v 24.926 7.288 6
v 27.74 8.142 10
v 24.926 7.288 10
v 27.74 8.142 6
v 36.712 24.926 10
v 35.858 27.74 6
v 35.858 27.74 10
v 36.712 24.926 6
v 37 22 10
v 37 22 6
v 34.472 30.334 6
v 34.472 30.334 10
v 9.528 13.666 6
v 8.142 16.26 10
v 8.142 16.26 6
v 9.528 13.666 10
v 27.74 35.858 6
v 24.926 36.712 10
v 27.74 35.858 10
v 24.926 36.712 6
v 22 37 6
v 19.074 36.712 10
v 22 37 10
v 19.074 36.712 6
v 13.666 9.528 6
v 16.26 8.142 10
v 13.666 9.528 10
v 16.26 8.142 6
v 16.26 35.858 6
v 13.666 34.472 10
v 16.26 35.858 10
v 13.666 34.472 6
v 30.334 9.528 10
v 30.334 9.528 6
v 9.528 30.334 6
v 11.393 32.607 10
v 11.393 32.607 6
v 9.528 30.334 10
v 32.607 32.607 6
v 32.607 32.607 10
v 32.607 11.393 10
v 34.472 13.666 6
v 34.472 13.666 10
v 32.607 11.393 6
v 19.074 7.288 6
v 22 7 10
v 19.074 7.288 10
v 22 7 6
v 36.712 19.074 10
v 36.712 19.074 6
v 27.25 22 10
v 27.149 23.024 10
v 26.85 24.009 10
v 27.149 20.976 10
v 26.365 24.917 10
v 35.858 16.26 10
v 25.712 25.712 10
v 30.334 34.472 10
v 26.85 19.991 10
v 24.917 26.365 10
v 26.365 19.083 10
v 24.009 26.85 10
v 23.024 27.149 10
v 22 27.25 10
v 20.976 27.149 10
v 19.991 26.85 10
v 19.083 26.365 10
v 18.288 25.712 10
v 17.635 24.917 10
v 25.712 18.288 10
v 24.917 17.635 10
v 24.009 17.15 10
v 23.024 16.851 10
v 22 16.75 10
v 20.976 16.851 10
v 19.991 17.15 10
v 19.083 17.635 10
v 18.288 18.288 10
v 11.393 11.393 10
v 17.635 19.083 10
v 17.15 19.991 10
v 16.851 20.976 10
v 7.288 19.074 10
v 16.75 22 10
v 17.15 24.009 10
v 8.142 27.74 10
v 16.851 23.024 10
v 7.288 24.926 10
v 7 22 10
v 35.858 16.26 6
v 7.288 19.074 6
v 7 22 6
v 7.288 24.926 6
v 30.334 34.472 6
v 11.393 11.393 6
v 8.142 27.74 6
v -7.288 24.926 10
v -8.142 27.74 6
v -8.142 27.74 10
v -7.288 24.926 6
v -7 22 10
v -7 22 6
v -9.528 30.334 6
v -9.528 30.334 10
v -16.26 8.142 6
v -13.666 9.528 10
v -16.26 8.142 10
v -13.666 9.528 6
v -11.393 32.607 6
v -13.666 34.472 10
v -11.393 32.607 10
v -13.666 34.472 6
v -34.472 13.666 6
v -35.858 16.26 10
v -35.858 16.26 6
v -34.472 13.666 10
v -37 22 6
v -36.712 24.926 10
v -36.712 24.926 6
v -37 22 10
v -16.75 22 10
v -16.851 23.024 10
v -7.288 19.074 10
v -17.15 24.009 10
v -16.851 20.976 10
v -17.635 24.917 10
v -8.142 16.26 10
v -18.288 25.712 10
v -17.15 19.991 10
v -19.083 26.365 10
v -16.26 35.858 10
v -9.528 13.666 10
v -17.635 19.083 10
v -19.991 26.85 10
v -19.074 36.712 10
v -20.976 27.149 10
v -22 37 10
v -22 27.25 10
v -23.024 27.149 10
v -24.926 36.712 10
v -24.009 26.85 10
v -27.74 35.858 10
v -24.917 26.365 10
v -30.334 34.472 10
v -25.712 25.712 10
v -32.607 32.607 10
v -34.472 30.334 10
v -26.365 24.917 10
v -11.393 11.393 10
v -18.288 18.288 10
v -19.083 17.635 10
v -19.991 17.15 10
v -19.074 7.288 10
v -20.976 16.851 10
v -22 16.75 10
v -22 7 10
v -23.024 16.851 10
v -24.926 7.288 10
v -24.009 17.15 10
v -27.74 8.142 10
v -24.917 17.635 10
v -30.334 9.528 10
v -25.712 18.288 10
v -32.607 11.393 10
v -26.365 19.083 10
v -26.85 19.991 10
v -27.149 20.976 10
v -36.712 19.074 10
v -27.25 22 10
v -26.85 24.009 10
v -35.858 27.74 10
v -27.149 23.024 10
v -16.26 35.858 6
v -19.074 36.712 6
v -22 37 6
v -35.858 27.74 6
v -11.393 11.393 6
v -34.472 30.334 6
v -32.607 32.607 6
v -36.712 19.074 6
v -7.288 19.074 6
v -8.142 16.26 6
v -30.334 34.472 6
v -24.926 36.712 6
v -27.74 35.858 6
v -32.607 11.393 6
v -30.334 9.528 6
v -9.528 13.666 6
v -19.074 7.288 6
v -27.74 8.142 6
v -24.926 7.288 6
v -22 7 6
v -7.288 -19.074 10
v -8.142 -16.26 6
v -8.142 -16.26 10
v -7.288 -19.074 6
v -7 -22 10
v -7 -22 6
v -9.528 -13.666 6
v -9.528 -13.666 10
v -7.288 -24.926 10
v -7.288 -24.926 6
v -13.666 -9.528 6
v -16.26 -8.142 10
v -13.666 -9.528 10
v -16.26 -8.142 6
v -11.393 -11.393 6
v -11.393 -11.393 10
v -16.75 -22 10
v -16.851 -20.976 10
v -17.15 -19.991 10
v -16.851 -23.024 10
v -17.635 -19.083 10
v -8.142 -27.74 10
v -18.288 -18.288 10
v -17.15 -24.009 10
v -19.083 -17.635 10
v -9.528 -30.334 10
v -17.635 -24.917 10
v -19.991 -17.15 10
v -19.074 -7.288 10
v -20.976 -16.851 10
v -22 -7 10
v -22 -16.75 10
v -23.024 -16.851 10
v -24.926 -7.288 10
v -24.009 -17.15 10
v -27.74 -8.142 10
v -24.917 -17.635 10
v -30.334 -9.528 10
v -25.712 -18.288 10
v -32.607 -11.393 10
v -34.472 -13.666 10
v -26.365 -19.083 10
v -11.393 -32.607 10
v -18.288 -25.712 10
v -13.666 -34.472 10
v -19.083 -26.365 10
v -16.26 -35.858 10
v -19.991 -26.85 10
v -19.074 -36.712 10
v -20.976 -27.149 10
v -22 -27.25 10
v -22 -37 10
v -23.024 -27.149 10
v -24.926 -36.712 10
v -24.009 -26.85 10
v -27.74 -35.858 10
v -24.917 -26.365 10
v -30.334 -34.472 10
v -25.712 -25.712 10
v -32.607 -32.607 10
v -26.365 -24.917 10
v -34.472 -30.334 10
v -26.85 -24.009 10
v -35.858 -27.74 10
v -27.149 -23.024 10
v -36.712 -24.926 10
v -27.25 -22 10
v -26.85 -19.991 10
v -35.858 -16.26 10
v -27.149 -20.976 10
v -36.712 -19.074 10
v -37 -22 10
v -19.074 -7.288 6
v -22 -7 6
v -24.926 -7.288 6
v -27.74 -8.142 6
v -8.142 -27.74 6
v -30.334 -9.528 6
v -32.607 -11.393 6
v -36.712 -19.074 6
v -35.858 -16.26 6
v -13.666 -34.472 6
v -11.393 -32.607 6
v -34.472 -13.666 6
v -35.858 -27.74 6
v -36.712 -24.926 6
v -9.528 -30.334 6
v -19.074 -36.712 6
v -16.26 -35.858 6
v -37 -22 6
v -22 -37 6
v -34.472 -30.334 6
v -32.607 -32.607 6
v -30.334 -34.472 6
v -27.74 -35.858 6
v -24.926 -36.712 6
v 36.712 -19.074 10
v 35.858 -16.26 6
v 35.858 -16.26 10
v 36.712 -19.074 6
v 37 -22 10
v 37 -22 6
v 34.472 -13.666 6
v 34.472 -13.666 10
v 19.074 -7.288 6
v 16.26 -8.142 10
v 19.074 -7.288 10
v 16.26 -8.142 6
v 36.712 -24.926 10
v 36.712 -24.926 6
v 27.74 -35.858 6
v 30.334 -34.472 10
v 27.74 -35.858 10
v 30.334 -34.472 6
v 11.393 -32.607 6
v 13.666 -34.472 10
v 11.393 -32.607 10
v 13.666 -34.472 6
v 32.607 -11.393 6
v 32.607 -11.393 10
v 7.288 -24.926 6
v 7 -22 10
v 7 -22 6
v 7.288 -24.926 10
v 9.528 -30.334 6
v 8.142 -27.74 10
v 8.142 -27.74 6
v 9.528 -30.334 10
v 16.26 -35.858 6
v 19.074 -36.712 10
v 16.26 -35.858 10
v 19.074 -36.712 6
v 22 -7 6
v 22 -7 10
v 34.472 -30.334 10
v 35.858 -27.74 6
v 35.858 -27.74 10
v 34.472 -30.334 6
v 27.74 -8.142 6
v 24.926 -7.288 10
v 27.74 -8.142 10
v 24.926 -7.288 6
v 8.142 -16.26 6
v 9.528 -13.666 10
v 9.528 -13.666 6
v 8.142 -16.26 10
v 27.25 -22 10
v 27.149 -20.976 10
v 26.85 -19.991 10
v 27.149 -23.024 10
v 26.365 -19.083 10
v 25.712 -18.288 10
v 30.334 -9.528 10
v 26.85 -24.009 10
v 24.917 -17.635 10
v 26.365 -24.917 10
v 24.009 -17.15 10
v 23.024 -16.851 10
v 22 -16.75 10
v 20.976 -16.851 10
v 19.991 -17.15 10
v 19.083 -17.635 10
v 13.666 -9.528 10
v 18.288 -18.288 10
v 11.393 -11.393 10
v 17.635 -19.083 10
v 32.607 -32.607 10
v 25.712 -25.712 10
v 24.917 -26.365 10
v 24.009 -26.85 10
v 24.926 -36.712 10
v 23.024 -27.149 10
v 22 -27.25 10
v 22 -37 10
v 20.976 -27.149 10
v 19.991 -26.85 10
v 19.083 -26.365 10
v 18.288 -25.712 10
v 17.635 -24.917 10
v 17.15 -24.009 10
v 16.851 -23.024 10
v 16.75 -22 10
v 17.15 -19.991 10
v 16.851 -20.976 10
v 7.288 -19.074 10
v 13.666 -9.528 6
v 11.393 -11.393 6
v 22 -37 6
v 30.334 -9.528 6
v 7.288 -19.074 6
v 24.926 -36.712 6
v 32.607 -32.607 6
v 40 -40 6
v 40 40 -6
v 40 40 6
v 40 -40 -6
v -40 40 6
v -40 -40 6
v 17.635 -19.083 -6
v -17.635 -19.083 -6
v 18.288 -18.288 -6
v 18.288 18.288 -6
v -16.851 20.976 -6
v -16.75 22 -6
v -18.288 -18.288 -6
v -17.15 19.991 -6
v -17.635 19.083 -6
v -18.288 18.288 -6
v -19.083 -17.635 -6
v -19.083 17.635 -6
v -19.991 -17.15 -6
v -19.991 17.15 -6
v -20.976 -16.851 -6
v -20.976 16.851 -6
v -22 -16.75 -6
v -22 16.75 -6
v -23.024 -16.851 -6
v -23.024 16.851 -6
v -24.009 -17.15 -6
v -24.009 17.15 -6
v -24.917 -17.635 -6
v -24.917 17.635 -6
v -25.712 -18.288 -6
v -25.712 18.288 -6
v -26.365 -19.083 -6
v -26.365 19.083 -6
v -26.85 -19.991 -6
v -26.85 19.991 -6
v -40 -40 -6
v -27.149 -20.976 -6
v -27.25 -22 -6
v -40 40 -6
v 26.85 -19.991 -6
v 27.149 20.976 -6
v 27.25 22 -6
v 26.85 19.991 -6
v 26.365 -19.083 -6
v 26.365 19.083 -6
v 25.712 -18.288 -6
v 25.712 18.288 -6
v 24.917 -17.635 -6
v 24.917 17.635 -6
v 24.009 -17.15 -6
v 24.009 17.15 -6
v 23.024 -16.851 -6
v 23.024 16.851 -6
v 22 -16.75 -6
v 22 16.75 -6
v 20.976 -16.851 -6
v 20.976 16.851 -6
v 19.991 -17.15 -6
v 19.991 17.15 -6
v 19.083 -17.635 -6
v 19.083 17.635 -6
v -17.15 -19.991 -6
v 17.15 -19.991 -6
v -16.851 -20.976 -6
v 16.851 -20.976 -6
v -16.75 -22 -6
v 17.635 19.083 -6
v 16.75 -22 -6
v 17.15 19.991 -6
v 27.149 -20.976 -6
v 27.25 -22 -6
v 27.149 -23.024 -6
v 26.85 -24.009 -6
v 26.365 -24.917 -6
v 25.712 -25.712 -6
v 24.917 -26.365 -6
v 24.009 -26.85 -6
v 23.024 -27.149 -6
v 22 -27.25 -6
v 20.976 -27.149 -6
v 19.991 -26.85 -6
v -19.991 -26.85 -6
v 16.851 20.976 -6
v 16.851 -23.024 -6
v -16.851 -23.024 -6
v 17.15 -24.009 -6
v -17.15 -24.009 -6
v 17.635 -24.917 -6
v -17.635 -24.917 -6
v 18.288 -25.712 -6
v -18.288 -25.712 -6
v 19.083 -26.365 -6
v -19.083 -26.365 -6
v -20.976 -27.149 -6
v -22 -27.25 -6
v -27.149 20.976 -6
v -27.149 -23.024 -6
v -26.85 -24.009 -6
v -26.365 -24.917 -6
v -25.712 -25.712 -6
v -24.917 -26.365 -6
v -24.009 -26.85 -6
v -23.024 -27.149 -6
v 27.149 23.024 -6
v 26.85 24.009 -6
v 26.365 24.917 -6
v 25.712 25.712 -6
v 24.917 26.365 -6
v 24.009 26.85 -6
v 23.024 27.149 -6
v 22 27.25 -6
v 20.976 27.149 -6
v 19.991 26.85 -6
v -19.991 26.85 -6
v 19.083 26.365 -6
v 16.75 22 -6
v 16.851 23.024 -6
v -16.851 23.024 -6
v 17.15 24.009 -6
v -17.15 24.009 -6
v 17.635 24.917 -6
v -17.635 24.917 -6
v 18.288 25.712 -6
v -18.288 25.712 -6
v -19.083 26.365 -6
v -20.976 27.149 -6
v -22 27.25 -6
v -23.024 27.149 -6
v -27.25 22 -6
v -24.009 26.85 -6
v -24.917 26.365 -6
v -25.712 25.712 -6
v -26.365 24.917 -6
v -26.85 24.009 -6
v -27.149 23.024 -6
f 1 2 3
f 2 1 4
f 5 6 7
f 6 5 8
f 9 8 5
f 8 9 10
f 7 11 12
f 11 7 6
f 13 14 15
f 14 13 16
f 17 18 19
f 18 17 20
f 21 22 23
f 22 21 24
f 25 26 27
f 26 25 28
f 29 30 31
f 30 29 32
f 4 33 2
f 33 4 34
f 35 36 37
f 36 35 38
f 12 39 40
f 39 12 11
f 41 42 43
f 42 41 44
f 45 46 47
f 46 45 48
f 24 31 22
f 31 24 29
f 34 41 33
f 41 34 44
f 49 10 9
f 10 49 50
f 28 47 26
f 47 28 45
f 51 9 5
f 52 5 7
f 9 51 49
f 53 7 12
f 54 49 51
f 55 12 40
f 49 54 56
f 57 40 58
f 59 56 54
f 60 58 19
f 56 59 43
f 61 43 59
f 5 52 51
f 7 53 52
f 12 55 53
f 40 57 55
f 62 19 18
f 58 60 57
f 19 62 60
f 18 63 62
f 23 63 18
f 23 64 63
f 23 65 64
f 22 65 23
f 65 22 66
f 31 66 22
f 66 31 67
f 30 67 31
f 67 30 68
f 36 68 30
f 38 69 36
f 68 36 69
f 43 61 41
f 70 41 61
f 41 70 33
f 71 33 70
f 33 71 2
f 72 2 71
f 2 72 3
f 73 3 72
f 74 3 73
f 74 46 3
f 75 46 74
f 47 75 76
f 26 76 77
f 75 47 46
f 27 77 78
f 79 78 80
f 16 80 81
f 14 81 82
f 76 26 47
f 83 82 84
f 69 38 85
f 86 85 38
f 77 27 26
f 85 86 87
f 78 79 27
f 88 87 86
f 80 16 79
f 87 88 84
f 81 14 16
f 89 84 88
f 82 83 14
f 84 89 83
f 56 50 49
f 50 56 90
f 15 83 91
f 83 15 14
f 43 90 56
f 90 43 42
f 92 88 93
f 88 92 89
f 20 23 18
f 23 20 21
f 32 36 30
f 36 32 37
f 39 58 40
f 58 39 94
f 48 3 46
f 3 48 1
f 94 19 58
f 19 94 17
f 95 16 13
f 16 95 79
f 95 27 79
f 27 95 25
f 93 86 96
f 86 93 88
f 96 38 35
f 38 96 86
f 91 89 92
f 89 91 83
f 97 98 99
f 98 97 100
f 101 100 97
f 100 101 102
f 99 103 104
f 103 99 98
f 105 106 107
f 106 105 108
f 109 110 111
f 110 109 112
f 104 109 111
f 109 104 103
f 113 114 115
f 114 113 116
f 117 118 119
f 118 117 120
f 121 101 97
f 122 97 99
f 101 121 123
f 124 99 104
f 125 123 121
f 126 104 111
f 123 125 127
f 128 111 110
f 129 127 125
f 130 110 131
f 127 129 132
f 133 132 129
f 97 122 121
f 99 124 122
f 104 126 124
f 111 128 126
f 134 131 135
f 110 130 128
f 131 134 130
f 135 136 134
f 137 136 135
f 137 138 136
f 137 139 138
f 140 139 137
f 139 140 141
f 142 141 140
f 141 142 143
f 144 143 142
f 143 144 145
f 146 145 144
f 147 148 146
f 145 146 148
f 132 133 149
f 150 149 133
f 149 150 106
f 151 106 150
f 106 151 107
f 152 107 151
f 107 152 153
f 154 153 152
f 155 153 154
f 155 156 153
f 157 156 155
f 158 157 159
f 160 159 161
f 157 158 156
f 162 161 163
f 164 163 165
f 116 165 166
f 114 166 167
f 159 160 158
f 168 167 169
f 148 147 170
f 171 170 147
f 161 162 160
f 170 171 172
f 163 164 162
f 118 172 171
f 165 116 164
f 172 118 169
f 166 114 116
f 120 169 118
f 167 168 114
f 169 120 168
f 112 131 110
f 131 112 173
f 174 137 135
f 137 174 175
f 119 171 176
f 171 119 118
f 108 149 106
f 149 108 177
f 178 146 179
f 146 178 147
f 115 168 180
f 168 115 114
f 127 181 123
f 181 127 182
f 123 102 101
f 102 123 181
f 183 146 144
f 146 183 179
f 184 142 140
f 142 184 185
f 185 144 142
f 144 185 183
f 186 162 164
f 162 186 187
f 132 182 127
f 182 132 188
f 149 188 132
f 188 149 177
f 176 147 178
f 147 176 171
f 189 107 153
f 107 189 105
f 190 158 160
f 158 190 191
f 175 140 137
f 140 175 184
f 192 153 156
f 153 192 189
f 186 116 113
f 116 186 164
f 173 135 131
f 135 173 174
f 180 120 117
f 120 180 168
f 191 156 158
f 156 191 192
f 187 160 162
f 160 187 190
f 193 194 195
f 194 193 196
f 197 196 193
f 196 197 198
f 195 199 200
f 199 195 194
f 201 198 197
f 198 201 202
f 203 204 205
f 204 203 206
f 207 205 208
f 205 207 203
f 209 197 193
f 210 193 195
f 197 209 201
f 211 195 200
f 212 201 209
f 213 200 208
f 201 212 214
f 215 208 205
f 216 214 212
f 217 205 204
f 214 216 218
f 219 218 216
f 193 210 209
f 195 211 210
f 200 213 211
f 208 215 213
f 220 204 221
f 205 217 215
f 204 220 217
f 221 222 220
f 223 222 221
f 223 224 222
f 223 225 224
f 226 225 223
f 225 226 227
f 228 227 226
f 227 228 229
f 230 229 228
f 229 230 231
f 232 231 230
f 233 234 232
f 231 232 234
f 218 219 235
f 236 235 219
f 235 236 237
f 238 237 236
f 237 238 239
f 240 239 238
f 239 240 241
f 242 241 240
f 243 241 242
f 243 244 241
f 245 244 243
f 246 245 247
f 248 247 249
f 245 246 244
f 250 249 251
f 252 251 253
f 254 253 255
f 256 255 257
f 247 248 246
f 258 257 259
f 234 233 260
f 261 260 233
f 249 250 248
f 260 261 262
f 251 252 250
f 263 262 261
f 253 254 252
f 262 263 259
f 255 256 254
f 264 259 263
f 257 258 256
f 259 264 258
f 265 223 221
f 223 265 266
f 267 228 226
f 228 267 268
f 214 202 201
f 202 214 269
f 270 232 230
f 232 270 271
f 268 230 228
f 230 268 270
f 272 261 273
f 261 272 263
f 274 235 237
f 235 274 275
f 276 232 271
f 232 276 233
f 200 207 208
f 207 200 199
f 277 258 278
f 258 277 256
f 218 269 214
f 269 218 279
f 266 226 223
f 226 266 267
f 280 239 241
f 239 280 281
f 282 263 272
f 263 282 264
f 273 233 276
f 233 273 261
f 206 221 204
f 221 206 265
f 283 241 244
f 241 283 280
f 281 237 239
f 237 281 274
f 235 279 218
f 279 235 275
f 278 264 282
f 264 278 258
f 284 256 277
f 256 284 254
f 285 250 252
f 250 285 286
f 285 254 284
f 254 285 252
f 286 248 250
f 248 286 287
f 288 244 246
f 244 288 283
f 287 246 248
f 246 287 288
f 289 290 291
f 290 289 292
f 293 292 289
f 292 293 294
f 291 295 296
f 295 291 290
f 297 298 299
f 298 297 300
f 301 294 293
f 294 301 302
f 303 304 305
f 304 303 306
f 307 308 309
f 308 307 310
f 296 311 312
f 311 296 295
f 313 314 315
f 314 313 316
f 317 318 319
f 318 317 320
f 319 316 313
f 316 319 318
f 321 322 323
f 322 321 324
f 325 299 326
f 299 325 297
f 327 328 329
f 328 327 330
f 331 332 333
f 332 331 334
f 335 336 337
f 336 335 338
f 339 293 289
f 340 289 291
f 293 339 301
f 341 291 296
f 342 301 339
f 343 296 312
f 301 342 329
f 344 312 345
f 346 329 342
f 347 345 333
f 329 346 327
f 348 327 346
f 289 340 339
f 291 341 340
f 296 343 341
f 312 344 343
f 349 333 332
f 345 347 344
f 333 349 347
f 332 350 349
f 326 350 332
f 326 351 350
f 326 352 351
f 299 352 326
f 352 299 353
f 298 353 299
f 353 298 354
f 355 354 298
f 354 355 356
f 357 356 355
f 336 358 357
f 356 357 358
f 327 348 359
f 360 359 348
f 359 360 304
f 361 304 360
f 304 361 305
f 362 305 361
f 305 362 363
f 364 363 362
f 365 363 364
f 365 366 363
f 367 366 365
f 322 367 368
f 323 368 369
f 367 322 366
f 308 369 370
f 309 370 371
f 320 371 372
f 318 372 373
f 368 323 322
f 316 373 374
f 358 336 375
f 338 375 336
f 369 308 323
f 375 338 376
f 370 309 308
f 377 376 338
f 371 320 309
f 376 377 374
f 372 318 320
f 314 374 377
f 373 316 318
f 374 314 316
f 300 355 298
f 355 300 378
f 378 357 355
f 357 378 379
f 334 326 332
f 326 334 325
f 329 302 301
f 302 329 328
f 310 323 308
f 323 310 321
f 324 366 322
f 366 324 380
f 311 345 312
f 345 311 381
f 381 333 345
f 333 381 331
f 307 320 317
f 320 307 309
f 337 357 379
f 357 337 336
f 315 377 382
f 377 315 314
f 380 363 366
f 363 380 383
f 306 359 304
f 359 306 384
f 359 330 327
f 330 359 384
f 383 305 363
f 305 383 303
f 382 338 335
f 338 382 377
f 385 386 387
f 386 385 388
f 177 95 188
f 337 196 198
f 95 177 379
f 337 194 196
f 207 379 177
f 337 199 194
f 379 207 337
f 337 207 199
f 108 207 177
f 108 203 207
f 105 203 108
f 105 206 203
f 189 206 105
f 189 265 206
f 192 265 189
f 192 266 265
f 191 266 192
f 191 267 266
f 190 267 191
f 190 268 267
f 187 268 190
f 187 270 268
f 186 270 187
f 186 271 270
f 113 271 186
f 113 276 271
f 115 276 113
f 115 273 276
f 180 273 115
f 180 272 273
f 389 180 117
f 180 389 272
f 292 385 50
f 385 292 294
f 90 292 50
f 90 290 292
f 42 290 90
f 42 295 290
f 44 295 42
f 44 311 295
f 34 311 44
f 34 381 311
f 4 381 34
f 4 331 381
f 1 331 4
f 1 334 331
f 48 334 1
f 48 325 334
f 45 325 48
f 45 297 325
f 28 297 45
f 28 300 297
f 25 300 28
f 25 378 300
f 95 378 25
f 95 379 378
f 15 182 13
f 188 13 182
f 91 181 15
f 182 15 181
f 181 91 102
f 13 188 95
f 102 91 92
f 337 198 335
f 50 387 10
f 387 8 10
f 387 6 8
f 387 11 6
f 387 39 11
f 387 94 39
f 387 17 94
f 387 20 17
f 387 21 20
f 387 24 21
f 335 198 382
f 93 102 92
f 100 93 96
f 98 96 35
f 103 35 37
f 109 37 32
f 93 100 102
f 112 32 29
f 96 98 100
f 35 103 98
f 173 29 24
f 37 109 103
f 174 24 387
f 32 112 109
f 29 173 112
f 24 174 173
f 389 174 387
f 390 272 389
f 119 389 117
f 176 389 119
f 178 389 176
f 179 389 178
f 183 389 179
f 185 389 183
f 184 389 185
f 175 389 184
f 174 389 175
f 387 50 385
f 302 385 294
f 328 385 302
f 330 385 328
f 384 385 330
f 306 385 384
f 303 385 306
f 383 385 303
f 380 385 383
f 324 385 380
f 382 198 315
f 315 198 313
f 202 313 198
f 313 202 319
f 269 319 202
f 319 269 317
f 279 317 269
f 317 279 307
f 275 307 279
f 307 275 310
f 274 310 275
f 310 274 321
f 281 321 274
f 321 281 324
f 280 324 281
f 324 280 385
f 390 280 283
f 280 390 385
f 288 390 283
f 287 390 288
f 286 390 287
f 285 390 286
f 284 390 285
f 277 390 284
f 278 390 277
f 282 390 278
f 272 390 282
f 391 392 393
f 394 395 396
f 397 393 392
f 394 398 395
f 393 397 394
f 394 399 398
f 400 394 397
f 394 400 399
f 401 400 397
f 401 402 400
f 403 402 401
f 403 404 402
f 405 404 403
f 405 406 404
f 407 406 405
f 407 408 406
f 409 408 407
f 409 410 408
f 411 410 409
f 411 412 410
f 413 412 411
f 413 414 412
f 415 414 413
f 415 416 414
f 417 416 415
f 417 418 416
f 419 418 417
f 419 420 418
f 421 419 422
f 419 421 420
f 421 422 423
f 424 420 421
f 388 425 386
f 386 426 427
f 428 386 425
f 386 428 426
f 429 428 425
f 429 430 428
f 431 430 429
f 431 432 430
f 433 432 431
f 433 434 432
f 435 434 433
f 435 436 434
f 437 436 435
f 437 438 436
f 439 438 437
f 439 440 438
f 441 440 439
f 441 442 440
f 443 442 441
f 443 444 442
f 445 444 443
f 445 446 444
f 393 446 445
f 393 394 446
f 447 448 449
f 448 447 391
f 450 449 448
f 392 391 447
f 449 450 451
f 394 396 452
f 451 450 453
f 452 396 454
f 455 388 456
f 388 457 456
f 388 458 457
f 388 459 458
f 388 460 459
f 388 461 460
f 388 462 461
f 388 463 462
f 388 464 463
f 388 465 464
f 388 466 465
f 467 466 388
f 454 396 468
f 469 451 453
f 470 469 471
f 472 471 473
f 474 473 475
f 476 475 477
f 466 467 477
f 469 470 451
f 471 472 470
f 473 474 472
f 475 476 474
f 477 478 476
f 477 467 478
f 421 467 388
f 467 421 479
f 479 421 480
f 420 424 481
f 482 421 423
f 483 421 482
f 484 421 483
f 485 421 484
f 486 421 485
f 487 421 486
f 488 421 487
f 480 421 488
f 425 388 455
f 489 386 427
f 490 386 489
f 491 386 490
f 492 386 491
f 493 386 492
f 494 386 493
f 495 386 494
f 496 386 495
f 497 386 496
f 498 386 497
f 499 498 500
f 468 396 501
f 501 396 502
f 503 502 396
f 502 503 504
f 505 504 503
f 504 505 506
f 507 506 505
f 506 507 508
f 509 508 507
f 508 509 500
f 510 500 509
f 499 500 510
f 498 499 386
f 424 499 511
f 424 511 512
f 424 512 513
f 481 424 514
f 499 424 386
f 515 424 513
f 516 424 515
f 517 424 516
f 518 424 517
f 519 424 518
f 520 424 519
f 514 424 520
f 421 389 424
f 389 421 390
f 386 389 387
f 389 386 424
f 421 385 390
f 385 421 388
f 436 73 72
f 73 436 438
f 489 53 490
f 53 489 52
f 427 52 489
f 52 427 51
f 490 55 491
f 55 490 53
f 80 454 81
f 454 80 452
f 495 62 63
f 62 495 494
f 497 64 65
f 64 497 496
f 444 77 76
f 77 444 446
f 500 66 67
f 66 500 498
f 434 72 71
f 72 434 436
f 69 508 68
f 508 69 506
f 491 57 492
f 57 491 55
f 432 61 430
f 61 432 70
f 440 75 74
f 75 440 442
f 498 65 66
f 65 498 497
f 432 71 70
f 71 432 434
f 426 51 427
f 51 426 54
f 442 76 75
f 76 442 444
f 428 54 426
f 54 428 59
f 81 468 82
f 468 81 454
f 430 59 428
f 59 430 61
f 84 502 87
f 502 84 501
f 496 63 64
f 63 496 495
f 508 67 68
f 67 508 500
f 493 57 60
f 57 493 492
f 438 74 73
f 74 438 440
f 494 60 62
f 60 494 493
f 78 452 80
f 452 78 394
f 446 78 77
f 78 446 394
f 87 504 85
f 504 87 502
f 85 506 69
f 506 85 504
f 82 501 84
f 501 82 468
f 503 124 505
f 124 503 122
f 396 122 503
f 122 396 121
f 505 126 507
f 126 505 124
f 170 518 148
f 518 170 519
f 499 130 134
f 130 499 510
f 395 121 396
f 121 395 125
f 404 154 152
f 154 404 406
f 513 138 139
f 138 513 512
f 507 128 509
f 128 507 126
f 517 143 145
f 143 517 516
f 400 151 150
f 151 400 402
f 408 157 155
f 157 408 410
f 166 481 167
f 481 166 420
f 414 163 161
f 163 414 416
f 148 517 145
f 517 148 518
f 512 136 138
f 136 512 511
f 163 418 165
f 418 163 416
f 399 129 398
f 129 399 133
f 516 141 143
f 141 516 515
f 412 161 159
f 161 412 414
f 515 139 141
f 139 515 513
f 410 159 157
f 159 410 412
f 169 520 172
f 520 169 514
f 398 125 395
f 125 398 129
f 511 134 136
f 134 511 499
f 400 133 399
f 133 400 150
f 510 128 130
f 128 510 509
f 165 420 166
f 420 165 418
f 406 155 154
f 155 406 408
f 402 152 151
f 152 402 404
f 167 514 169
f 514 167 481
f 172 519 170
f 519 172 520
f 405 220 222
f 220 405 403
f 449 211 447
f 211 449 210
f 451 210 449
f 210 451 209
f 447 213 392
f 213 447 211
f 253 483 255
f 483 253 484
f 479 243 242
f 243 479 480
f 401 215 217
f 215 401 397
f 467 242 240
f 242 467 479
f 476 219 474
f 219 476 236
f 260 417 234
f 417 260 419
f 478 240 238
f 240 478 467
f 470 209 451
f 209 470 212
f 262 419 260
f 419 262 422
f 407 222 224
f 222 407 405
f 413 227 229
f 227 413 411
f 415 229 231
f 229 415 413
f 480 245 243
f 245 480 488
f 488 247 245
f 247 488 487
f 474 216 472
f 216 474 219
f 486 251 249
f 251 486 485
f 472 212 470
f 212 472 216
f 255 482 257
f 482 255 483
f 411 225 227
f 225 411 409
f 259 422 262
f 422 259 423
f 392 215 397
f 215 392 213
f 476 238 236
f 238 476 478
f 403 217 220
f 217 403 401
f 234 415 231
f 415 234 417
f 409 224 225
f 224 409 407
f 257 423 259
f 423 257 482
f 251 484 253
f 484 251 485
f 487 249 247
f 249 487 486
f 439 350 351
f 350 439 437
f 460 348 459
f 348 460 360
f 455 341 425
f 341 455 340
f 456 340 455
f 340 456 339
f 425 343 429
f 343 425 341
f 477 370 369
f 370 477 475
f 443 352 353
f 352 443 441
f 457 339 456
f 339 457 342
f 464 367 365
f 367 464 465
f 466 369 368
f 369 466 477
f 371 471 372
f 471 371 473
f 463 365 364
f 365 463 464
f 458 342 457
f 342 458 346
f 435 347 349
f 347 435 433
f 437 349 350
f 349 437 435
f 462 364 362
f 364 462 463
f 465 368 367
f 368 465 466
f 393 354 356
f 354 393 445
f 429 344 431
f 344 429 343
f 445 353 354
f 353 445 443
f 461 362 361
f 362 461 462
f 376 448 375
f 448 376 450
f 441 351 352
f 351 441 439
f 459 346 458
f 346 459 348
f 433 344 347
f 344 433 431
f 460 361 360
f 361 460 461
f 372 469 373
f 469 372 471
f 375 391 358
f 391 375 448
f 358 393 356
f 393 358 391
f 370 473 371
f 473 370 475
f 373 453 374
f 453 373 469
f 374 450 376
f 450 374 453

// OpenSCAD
$fn = 32;

// ----------------------------------------------------------------------
// Anchor pads 80 x 80 x 16
// four corner bosses with anchor holes
// ----------------------------------------------------------------------

// --- parameters (mm) ---
plate = [80, 80, 12];  // base plate size (x, y, z)
pads = 4;              // boss count, one per corner
edge = 18;             // boss centre offset from the plate edge
boss_d = 30;           // boss diameter
boss_h = 4;            // boss height above the base plate
hole_d = 10.5;         // hole diameter

// --- derived feature positions (mm) ---
height = plate[2] + boss_h;      // = 16   overall height of the part
corner_x = plate[0] / 2 - edge;  // = 22   boss centre X
corner_y = plate[1] / 2 - edge;  // = 22   boss centre Y
feature_centers = [
  [corner_x, corner_y],
  [-corner_x, corner_y],
  [-corner_x, -corner_y],
  [corner_x, -corner_y]
];   // boss centres, anchor holes are drilled there

// base plate, four bosses standing on it, anchor holes all the way through
difference() {
  union() {
    cube(plate, center = true);
    for (centre = feature_centers)
      translate([centre[0], centre[1], plate[2] / 2 - 1])
        cylinder(d = boss_d, h = boss_h + 1);
  }
  for (centre = feature_centers)
    translate([centre[0], centre[1], -height])
      cylinder(d = hole_d, h = 2 * height + 2);  // through boss and plate
}
